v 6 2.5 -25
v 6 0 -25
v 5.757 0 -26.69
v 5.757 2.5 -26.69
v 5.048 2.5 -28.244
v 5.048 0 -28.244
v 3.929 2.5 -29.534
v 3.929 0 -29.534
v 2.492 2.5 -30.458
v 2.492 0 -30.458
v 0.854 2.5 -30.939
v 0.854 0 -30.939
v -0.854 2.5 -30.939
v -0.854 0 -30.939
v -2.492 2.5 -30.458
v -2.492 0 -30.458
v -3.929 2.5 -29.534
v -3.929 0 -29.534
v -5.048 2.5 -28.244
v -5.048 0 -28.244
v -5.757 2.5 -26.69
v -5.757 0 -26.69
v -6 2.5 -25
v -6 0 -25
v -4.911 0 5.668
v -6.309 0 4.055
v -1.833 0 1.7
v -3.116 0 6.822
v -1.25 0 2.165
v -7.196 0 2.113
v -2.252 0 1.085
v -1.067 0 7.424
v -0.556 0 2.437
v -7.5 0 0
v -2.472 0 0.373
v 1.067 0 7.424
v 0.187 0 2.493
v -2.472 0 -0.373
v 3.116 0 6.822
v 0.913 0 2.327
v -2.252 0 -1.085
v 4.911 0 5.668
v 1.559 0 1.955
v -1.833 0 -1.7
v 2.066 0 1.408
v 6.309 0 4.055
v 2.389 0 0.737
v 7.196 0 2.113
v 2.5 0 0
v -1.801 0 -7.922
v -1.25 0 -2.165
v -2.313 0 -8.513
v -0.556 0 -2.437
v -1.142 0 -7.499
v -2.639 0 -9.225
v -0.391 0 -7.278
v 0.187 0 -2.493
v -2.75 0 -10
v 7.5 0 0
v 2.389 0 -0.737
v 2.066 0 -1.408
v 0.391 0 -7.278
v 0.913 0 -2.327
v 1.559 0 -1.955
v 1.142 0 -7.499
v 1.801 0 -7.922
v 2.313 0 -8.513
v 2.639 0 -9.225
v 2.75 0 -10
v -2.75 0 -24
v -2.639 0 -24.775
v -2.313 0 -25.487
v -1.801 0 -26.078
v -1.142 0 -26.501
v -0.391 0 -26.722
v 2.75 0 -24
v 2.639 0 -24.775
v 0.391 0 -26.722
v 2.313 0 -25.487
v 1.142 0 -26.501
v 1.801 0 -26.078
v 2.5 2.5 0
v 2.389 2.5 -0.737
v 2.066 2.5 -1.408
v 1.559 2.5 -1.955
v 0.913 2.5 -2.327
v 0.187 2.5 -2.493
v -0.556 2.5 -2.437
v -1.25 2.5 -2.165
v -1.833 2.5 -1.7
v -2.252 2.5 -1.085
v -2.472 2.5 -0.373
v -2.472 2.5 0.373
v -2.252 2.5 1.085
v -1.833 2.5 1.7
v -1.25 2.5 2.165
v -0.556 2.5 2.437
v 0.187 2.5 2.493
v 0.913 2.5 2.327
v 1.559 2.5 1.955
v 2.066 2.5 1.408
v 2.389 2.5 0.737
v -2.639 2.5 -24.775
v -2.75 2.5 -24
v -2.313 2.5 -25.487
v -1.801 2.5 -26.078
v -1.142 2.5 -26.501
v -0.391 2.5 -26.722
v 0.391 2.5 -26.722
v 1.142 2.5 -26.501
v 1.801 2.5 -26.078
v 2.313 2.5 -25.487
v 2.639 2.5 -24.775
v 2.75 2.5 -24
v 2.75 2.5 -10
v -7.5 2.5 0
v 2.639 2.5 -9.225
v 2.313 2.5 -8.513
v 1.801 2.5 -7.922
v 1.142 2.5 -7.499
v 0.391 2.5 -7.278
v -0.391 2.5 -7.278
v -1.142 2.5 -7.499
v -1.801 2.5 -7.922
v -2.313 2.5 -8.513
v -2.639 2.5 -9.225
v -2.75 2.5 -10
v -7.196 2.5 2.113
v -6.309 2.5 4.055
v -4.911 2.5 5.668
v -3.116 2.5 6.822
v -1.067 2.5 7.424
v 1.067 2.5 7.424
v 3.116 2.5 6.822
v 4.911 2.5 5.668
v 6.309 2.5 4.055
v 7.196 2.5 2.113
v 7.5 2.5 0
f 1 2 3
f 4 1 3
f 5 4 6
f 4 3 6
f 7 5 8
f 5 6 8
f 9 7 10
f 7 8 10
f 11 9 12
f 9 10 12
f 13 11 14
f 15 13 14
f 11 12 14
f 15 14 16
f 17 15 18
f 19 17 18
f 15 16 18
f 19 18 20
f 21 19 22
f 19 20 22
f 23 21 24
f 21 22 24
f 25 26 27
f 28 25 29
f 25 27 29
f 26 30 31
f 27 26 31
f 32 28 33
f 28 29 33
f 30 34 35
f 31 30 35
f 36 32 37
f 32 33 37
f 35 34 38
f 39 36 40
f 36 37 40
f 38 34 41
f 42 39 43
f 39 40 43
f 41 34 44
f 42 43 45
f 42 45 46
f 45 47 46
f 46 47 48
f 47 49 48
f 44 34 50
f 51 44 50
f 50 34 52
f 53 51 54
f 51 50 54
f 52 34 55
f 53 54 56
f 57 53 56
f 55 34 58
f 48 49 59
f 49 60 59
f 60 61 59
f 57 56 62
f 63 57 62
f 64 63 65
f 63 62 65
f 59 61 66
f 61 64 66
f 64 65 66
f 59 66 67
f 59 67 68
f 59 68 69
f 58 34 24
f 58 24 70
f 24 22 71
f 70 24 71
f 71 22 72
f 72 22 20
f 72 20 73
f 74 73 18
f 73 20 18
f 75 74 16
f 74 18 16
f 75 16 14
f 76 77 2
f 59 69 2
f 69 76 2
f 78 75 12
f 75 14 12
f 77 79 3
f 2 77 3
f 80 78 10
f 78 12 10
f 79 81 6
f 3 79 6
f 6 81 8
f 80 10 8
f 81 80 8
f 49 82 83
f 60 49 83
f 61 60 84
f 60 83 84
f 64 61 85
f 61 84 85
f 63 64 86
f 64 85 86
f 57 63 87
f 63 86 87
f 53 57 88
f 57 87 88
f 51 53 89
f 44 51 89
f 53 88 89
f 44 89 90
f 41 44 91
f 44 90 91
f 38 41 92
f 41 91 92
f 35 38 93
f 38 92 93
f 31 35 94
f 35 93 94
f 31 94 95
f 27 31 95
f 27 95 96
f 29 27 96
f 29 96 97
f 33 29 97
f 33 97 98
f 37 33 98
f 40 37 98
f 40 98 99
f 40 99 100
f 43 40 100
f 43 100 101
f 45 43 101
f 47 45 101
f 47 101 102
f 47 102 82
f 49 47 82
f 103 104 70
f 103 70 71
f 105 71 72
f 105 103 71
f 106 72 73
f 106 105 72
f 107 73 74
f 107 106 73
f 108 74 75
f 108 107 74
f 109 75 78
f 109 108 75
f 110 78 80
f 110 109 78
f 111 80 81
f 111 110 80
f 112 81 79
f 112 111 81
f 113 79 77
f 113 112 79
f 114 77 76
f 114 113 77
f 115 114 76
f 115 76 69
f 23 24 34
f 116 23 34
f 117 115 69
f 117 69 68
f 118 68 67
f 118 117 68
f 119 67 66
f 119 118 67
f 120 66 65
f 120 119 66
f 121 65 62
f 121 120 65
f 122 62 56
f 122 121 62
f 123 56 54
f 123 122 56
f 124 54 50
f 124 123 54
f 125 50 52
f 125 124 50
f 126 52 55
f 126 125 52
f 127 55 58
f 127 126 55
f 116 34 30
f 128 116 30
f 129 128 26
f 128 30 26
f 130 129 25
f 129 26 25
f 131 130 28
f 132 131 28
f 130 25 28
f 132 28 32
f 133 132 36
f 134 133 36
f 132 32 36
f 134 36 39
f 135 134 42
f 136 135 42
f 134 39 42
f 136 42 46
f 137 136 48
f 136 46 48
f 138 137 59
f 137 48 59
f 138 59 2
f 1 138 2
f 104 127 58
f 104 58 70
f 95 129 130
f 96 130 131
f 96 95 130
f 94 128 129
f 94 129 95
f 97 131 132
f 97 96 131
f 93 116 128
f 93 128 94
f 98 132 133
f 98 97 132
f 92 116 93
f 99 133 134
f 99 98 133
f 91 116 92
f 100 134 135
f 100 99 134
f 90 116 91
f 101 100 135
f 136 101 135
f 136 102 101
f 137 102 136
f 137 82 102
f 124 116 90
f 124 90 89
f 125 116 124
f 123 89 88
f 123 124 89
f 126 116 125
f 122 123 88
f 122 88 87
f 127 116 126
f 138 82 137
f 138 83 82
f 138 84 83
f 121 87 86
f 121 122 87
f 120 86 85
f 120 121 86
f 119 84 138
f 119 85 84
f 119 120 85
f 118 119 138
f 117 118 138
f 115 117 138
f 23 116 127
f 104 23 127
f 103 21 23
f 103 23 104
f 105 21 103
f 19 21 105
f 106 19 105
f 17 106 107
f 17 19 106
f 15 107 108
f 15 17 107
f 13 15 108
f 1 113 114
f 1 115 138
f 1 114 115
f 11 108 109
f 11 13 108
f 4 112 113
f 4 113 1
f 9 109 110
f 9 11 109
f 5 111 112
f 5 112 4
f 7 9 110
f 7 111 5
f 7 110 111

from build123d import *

# Parameters (mm, degrees)
BOSS_EXTRUDE1_DEPTH = 2.5
SKETCH2_R           = 2.5
CUT_EXTRUDE1_DEPTH  = 3.5


with BuildPart() as part:
    # Sketch1 → Boss-Extrude1 (new body)
    with BuildSketch(Plane(origin=(0, 0, 0), x_dir=(1, 0, 0), z_dir=(0, 1, 0))):
        with BuildLine():
            Line((-6, 25), (-7.5, 0))
            ThreePointArc((-7.5, 0), (0, -7.5), (7.5, 0))
            Line((7.5, 0), (6, 25))
            ThreePointArc((6, 25), (0, 31), (-6, 25))
        make_face()
    extrude(amount=BOSS_EXTRUDE1_DEPTH)

    # Sketch2 → Cut-Extrude1 (cut, through all)
    with BuildSketch(Plane(origin=(0, 2.5, 0), x_dir=(1, 0, 0), z_dir=(0, 1, 0))):
        Circle(SKETCH2_R)
        with BuildLine():
            Line((2.75, 24), (2.75, 10))
            ThreePointArc((2.75, 10), (0, 7.25), (-2.75, 10))
            Line((-2.75, 10), (-2.75, 24))
            ThreePointArc((-2.75, 24), (0, 26.75), (2.75, 24))
        make_face()
    extrude(amount=-CUT_EXTRUDE1_DEPTH, mode=Mode.SUBTRACT)


solid = part.part
